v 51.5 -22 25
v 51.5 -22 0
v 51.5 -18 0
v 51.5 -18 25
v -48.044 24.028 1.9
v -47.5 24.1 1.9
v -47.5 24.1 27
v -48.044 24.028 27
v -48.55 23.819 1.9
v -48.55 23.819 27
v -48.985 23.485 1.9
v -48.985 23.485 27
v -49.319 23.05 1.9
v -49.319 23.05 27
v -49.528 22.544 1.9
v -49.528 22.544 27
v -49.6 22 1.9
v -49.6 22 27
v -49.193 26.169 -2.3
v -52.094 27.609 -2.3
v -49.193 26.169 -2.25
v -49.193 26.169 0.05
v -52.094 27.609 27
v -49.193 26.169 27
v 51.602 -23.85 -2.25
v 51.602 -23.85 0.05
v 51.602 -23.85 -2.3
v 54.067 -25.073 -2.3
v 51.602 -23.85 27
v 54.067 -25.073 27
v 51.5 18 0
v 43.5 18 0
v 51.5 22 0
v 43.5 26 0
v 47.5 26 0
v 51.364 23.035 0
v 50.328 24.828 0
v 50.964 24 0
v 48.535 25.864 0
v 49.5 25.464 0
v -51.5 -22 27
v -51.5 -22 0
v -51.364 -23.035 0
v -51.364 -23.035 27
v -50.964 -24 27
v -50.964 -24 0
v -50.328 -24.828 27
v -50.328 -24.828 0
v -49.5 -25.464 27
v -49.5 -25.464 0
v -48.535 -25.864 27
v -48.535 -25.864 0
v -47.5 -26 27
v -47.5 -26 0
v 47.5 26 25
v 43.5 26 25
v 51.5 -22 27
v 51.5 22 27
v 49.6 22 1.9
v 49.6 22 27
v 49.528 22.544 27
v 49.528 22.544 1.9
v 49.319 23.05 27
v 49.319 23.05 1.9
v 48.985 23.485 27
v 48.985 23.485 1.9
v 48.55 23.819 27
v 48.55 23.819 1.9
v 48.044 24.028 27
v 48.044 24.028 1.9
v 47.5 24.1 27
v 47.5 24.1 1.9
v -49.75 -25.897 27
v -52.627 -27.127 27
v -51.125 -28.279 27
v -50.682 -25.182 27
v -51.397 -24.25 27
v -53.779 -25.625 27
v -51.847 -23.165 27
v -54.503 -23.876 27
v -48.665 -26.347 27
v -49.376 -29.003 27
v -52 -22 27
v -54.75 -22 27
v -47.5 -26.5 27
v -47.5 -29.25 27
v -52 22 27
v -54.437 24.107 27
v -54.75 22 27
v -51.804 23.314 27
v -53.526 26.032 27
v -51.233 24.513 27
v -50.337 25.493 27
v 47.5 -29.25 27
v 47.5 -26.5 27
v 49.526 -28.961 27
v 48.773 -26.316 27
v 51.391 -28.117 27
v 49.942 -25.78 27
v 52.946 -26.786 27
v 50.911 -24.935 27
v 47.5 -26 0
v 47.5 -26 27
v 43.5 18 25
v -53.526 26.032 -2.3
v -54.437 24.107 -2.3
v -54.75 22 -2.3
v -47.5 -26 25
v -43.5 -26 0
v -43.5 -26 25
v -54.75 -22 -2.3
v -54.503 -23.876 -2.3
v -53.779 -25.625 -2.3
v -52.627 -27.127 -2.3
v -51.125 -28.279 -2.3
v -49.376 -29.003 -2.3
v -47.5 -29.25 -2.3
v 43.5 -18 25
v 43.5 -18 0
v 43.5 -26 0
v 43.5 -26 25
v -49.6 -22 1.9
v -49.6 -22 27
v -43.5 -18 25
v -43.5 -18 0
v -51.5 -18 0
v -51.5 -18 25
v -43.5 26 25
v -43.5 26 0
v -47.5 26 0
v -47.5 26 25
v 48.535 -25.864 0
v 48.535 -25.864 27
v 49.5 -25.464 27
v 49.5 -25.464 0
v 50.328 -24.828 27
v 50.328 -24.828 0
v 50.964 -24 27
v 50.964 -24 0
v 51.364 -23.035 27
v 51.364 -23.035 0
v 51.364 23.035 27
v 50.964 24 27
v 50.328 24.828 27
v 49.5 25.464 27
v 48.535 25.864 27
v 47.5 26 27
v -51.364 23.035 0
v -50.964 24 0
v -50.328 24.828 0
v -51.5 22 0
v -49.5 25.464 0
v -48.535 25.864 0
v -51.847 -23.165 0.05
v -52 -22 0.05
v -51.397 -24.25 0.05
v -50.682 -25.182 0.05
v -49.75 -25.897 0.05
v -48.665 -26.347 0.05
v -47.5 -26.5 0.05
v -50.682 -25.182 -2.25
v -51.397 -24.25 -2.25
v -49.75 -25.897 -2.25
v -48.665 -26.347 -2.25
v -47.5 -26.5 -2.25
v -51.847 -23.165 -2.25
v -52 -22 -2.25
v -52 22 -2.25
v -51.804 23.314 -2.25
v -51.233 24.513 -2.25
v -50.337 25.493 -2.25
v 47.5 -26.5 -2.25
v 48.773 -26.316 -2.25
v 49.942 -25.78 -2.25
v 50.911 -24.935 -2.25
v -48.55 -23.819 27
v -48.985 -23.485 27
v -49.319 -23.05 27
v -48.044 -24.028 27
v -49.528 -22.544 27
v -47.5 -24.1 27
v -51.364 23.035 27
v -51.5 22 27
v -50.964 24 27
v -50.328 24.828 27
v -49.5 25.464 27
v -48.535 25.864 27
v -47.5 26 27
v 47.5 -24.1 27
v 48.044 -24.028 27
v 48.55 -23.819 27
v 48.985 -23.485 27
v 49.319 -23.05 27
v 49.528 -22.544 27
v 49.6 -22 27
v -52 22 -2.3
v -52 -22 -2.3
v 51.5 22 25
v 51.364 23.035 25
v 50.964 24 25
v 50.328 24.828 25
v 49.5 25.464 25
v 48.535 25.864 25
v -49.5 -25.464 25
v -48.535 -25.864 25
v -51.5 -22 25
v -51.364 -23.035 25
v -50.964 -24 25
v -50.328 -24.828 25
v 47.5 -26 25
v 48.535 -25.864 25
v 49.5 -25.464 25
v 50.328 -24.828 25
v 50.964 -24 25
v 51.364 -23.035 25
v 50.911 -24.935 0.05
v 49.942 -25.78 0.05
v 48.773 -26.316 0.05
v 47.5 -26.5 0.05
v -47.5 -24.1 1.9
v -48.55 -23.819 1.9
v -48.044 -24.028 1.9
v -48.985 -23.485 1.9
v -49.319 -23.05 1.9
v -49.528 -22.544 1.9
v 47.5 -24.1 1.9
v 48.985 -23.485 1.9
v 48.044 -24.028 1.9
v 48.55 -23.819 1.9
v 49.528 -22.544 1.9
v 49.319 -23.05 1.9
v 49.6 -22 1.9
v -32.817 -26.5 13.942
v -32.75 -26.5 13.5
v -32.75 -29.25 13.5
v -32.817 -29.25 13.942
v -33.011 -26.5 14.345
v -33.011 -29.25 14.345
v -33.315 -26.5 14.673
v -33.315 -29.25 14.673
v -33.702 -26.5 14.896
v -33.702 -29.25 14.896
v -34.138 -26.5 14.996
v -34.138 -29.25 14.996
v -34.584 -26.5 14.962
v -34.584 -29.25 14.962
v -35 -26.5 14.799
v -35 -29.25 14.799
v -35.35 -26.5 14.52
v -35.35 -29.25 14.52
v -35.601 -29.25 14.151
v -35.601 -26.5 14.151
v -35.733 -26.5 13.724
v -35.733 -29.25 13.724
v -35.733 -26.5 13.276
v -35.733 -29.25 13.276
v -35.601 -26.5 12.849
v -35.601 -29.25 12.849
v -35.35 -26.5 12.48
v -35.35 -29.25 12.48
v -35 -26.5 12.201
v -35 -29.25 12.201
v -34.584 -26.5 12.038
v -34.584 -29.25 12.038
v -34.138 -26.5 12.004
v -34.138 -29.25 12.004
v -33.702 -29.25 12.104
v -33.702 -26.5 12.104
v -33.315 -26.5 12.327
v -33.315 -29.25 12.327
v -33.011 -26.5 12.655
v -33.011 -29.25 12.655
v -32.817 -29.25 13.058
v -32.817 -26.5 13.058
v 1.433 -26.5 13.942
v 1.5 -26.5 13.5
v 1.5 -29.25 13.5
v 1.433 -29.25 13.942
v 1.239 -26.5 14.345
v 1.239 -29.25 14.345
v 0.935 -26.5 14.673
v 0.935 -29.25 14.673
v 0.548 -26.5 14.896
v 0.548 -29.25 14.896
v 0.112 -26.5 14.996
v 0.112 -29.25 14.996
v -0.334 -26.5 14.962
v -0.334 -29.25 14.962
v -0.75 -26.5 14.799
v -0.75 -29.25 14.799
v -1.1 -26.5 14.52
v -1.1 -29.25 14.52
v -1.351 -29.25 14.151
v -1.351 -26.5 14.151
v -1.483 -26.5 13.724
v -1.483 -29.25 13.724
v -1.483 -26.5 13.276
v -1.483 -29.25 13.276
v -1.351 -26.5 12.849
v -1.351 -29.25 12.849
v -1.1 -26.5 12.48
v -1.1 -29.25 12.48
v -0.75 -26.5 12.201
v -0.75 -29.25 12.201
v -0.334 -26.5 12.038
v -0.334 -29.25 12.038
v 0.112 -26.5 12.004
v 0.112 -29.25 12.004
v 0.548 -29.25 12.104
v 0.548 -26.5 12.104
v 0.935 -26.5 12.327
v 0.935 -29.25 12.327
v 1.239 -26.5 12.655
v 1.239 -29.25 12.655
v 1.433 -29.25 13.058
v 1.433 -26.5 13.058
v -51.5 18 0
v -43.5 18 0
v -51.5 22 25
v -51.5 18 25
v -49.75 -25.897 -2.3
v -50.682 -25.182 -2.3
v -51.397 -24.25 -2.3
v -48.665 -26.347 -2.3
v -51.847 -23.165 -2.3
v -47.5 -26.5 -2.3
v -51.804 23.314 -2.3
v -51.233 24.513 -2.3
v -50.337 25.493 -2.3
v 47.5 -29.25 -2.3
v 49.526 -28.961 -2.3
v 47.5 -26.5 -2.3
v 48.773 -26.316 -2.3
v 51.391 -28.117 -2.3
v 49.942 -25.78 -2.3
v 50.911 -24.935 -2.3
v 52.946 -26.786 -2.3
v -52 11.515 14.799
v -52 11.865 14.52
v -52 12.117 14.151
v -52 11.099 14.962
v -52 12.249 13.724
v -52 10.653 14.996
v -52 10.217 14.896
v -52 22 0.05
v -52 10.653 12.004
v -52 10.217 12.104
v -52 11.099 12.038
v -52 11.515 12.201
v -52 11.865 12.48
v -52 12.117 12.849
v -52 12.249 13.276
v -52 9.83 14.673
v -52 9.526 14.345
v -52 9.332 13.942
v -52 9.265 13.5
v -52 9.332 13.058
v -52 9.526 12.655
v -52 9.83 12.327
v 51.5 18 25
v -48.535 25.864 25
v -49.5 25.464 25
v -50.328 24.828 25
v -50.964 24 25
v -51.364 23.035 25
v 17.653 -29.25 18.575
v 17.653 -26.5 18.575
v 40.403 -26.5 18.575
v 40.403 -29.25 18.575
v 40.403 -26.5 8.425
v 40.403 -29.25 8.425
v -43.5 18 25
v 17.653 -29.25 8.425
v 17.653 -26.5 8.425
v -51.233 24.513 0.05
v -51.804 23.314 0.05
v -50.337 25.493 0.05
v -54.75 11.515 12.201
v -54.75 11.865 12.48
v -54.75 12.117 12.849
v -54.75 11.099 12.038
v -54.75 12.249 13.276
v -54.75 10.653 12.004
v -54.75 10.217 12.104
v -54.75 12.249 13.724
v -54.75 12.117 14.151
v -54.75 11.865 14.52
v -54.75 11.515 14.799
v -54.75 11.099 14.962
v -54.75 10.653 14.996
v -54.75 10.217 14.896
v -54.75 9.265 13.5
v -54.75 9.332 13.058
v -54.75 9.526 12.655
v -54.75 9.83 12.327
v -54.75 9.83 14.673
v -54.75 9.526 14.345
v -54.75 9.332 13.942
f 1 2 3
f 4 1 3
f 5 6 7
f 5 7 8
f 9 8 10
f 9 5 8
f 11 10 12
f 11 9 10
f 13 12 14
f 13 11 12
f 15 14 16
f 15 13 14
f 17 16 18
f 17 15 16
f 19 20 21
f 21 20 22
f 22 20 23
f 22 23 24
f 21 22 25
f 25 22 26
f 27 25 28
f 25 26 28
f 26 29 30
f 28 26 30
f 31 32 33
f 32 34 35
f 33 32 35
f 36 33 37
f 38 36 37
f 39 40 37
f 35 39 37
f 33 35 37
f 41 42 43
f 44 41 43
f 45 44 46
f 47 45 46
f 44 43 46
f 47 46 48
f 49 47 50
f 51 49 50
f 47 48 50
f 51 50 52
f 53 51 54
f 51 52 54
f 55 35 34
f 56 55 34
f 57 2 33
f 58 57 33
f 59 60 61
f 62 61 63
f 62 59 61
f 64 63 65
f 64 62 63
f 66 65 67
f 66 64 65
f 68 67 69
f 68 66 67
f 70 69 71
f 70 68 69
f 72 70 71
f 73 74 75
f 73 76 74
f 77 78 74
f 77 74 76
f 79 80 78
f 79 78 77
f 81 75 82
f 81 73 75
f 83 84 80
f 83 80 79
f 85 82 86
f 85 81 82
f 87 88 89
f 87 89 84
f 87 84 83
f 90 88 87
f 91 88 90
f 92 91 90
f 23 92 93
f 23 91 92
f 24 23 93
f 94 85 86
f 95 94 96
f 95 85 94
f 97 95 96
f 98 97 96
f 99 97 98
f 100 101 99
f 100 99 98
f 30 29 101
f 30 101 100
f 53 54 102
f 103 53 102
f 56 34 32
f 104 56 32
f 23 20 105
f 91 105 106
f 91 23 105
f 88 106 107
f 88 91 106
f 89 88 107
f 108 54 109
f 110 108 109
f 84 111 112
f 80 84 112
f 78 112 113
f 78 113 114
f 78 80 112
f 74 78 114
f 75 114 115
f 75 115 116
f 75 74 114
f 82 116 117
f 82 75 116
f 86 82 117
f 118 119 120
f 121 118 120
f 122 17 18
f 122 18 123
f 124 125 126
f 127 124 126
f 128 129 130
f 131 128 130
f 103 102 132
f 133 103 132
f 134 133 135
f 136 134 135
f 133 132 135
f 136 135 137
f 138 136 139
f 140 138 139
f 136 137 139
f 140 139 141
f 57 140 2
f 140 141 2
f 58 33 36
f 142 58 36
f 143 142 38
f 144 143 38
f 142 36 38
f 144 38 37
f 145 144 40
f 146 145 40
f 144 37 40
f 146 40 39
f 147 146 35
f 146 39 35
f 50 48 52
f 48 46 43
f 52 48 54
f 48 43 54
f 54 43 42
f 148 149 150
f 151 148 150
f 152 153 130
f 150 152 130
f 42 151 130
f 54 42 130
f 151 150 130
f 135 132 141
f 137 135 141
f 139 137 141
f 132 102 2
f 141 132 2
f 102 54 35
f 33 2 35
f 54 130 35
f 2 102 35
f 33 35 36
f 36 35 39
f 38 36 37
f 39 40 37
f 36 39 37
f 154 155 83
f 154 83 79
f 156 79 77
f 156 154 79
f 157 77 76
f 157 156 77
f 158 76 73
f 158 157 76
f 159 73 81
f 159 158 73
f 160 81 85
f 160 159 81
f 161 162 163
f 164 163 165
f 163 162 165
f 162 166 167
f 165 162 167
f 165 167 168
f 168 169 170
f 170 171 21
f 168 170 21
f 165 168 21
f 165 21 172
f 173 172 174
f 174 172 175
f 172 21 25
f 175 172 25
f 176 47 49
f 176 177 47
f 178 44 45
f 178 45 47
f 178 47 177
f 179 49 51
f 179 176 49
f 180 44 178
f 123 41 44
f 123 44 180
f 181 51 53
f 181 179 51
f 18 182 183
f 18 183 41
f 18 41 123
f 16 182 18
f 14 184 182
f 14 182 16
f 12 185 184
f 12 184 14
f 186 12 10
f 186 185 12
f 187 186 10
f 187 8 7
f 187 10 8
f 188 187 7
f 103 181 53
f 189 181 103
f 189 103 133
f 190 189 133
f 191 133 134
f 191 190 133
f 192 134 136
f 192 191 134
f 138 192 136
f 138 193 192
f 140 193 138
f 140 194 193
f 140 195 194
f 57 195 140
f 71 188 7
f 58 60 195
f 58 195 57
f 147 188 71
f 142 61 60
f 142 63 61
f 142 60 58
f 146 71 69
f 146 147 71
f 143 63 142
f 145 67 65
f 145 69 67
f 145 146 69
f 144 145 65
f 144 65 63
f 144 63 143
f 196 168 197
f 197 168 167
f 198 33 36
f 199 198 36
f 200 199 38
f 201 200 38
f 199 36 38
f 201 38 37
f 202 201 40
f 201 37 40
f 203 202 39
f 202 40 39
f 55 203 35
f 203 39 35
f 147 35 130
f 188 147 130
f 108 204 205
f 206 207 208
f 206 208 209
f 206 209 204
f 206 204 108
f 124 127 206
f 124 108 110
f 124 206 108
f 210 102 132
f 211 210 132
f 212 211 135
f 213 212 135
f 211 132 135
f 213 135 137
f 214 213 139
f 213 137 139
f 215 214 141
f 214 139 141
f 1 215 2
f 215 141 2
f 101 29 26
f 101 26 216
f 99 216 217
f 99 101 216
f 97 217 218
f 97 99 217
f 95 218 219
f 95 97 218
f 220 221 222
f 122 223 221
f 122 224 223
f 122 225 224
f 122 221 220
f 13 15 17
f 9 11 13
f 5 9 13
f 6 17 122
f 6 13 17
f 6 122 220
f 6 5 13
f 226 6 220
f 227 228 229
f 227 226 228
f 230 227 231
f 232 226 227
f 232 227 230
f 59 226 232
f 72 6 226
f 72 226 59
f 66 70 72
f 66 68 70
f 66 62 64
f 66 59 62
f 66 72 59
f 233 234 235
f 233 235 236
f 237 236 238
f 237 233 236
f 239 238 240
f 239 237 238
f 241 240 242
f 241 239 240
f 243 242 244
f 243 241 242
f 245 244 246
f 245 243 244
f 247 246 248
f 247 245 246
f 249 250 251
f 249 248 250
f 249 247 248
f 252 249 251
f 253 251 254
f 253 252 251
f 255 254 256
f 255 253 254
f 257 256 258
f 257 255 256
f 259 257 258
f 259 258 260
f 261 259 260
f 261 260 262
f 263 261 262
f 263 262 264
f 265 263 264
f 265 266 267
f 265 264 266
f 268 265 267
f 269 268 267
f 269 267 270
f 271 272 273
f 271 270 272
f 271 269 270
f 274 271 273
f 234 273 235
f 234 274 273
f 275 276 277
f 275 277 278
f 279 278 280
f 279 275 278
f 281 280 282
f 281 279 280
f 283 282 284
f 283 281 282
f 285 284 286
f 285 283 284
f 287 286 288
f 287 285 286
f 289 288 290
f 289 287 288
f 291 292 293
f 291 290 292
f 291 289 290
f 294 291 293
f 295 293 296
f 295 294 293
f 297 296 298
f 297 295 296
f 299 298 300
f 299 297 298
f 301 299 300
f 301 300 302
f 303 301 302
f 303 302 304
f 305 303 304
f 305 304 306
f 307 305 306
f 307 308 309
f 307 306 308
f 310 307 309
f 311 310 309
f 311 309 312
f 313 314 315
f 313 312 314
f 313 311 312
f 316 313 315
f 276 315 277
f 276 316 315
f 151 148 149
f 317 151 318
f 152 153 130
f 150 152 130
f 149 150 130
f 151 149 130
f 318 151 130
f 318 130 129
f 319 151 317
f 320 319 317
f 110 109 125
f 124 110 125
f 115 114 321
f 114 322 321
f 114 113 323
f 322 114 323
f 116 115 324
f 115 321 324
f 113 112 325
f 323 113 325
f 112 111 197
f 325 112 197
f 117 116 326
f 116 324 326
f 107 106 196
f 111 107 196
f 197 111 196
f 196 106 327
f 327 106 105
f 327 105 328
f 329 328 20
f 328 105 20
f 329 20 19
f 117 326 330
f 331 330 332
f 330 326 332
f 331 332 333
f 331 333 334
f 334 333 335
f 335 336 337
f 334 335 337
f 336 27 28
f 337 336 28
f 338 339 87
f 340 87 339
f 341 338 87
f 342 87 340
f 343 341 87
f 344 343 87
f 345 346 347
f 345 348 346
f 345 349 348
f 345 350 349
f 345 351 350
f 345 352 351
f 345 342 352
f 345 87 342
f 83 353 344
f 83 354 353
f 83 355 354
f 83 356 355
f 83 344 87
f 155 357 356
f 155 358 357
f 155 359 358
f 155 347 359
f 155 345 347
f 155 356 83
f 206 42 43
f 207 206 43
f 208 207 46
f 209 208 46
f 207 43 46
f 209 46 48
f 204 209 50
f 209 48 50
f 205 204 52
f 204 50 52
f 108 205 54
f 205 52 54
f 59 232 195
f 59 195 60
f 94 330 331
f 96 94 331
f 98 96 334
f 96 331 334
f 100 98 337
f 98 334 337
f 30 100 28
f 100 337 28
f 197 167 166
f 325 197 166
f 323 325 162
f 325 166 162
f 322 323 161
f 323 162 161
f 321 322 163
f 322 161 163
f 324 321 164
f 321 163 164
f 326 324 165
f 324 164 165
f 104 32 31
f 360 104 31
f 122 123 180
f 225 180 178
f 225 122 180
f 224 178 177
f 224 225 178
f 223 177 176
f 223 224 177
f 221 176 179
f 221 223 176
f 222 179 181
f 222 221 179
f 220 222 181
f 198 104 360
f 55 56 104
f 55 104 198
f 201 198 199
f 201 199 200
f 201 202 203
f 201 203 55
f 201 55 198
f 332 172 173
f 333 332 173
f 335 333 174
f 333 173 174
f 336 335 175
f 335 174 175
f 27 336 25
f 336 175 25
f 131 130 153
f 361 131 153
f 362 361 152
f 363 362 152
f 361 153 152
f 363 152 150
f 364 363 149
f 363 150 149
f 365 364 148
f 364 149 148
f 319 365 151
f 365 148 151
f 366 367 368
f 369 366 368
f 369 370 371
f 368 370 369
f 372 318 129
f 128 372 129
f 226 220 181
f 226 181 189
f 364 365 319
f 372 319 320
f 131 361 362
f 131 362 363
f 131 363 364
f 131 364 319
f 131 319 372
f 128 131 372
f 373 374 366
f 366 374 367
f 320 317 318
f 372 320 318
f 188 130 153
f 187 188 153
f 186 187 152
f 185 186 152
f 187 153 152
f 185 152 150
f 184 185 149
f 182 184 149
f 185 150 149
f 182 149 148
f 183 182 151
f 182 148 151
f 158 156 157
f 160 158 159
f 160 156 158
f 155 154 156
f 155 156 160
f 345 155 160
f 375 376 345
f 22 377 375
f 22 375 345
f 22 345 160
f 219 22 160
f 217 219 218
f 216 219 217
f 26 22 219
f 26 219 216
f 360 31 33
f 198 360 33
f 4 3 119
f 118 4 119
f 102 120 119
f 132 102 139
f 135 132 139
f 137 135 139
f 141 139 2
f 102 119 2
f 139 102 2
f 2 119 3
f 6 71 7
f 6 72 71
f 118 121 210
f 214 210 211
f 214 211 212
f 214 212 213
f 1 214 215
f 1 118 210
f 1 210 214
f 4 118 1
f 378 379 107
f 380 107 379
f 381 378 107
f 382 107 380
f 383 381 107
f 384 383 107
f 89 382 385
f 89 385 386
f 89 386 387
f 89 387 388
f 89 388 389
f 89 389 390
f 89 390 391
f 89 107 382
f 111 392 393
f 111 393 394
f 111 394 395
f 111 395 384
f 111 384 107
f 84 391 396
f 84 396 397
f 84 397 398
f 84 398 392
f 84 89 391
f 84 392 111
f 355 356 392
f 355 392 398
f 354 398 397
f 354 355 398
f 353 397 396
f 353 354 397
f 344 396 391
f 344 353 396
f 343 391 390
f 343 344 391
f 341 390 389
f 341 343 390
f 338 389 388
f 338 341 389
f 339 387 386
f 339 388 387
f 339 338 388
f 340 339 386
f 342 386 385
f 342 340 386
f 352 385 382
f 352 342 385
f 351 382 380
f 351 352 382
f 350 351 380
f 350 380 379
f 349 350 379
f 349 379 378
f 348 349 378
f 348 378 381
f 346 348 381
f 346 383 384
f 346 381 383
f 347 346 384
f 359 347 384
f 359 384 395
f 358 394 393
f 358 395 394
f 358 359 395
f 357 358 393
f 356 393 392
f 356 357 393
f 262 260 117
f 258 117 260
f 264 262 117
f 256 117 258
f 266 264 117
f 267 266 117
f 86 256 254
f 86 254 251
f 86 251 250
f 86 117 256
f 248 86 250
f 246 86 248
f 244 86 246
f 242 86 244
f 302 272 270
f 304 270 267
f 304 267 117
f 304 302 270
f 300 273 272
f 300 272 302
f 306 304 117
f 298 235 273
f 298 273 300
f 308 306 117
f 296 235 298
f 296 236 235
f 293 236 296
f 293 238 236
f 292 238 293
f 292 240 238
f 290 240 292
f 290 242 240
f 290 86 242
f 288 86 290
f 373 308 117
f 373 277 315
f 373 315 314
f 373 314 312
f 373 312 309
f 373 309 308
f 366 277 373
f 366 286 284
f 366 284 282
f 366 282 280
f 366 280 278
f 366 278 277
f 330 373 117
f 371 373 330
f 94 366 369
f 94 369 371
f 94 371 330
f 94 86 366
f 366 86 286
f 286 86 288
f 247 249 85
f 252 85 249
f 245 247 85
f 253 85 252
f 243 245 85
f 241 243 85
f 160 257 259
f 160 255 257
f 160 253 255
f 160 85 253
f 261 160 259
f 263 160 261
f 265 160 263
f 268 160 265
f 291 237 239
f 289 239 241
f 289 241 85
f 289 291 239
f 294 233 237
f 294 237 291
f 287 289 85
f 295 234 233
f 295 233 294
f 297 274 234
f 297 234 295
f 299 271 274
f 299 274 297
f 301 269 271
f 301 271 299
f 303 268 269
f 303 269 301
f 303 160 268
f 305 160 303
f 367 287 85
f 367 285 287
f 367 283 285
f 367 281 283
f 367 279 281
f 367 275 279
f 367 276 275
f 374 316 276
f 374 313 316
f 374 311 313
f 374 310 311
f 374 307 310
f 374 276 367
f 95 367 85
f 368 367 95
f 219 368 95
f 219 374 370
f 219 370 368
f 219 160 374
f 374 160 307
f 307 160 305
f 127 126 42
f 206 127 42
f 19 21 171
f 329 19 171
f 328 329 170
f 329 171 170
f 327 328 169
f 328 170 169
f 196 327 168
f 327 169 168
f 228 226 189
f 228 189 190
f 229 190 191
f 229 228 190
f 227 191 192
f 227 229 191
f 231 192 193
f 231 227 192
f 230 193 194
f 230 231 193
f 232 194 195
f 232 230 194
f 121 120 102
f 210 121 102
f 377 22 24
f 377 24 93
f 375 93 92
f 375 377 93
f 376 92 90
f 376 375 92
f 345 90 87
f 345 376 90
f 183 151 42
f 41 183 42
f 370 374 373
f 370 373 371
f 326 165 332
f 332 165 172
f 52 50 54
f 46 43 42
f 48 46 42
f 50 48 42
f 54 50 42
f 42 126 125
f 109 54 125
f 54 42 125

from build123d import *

# Parameters (mm, degrees)
F1_DEPTH  = 27
F2_T      = -1.9
F4_DEPTH  = 25
F9_DEPTH  = 27
F10_T     = -2.75
F6_R      = 1.5
F6_W      = 22.75
F6_H      = 10.15
F11_DEPTH = 25
F5_R      = 1.5
F12_DEPTH = 25
F14_DEPTH = 30
F15_DEPTH = 5
F16_DEPTH = 2.3
F17_DEPTH = 2.7


with BuildPart() as f1:
    # F0 (on Top) → F1 (new body)
    with BuildSketch(Plane.XY):
        Polygon((43.5, 18), (43.5, 26), (-43.5, 26), (-43.5, 18), (-51.5, 18), (-51.5, -18), (-43.5, -18), (-43.5, -26), (43.5, -26), (43.5, -18), (51.5, -18), (51.5, 18), align=None)
        with BuildLine():
            Line((-43.5, 18), (-43.5, 26))
            Line((-43.5, 26), (-47.5, 26))
            ThreePointArc((-47.5, 26), (-50.3284271247, 24.8284271247), (-51.5, 22))
            Line((-51.5, 22), (-51.5, 18))
            Line((-51.5, 18), (-43.5, 18))
        make_face()
        with BuildLine():
            ThreePointArc((51.5, 22), (50.3284271247, 24.8284271247), (47.5, 26))
            Line((47.5, 26), (43.5, 26))
            Line((43.5, 26), (43.5, 18))
            Line((43.5, 18), (51.5, 18))
            Line((51.5, 18), (51.5, 22))
        make_face()
        with BuildLine():
            Line((51.5, -22), (51.5, -18))
            Line((51.5, -18), (43.5, -18))
            Line((43.5, -18), (43.5, -26))
            Line((43.5, -26), (47.5, -26))
            ThreePointArc((47.5, -26), (50.3284271247, -24.8284271247), (51.5, -22))
        make_face()
        with BuildLine():
            Line((-43.5, -18), (-51.5, -18))
            Line((-51.5, -18), (-51.5, -22))
            ThreePointArc((-51.5, -22), (-50.3284271247, -24.8284271247), (-47.5, -26))
            Line((-47.5, -26), (-43.5, -26))
            Line((-43.5, -26), (-43.5, -18))
        make_face()
    extrude(amount=F1_DEPTH)

    # F2
    f2_openings = [f1.faces().sort_by_distance(p)[0] for p in [
        (0, 0, 27),
    ]]
    offset(amount=F2_T, openings=f2_openings)


with BuildPart() as f4:
    # F3 (on face) → F4 (new body)
    with BuildSketch(Plane.XY):
        with BuildLine():
            Line((-43.5, 18), (-43.5, 26))
            Line((-43.5, 26), (-47.5, 26))
            ThreePointArc((-47.5, 26), (-50.3284271247, 24.8284271247), (-51.5, 22))
            Line((-51.5, 22), (-51.5, 18))
            Line((-51.5, 18), (-43.5, 18))
        make_face()
    extrude(amount=F4_DEPTH)


with BuildPart() as f4b:
    # F0 (on Top) → F4, piece 2 (new body)
    with BuildSketch(Plane.XY):
        with BuildLine():
            Line((-43.5, -18), (-51.5, -18))
            Line((-51.5, -18), (-51.5, -22))
            ThreePointArc((-51.5, -22), (-50.3284271247, -24.8284271247), (-47.5, -26))
            Line((-47.5, -26), (-43.5, -26))
            Line((-43.5, -26), (-43.5, -18))
        make_face()
    extrude(amount=F4_DEPTH)


with BuildPart() as f4c:
    # F0 (on Top) → F4, piece 3 (new body)
    with BuildSketch(Plane.XY):
        with BuildLine():
            Line((51.5, -22), (51.5, -18))
            Line((51.5, -18), (43.5, -18))
            Line((43.5, -18), (43.5, -26))
            Line((43.5, -26), (47.5, -26))
            ThreePointArc((47.5, -26), (50.3284271247, -24.8284271247), (51.5, -22))
        make_face()
    extrude(amount=F4_DEPTH)


with BuildPart() as f4d:
    # F0 (on Top) → F4, piece 4 (new body)
    with BuildSketch(Plane.XY):
        with BuildLine():
            ThreePointArc((51.5, 22), (50.3284271247, 24.8284271247), (47.5, 26))
            Line((47.5, 26), (43.5, 26))
            Line((43.5, 26), (43.5, 18))
            Line((43.5, 18), (51.5, 18))
            Line((51.5, 18), (51.5, 22))
        make_face()
    extrude(amount=F4_DEPTH)


with BuildPart() as f9:
    # F8 (on Top) → F9 (new body)
    with BuildSketch(Plane.XY):
        with BuildLine():
            Line((47.5, 29.25), (-47.5, 29.25))
            ThreePointArc((-47.5, 29.25), (-52.6265241636, 27.1265241636), (-54.75, 22))
            Line((-54.75, 22), (-54.75, -22))
            ThreePointArc((-54.75, -22), (-52.6265241636, -27.1265241636), (-47.5, -29.25))
            Line((-47.5, -29.25), (47.5, -29.25))
            ThreePointArc((47.5, -29.25), (52.6265241636, -27.1265241636), (54.75, -22))
            Line((54.75, -22), (54.75, 22))
            ThreePointArc((54.75, 22), (52.6265241636, 27.1265241636), (47.5, 29.25))
        make_face()
    extrude(amount=F9_DEPTH)

    # F10
    f10_openings = [f9.faces().sort_by_distance(p)[0] for p in [
        (0, 0, 27),
    ]]
    offset(amount=F10_T, openings=f10_openings)

    # F6 (on face) → F11 (cut)
    with BuildSketch(Plane.XZ.offset(26)):
        with Locations((-34.2500010431, 13.5)):
            Circle(F6_R)
        with Locations((0, 13.5)):
            Circle(F6_R)
        with Locations((29.0283542126, 13.5)):
            Rectangle(F6_W, F6_H)
    extrude(amount=F11_DEPTH, mode=Mode.SUBTRACT)

    # F5 (on face) → F12 (cut)
    with BuildSketch(Plane(origin=(-51.5, 0, 0), x_dir=(0, -1, 0), z_dir=(-1, 0, 0))):
        with Locations((-10.7654500753, 13.5)):
            Circle(F5_R)
    extrude(amount=F12_DEPTH, mode=Mode.SUBTRACT)

    # F13 (on Top) → F14 (cut)
    with BuildSketch(Plane.XY):
        Polygon((65.3300657868, 29.3469112366), (-55.5969104171, 29.3469112366), (62.0856769383, -29.0519669652), align=None)
    extrude(amount=F14_DEPTH, mode=Mode.SUBTRACT)

    # F15 (add): a face of the model
    f15_faces = [f9.faces().sort_by_distance(p)[0] for p in [
        (-15.8065422029, -8.455255524, 2.75),
    ]]
    extrude(f15_faces, amount=-F15_DEPTH)

    # F16 (add): a face of the model
    f16_faces = [f9.faces().sort_by_distance(p)[0] for p in [
        (-51.1894899225, 25.7891492293, 0),
    ]]
    extrude(f16_faces, amount=F16_DEPTH)

    # F17 (cut): a face of the model
    f17_faces = [f9.faces().sort_by_distance(p)[0] for p in [
        (-15.8065422029, -8.455255524, 2.75),
    ]]
    extrude(f17_faces, amount=-F17_DEPTH, mode=Mode.SUBTRACT)


solid = Compound([f1.part, f4.part, f4b.part, f4c.part, f4d.part, f9.part])
